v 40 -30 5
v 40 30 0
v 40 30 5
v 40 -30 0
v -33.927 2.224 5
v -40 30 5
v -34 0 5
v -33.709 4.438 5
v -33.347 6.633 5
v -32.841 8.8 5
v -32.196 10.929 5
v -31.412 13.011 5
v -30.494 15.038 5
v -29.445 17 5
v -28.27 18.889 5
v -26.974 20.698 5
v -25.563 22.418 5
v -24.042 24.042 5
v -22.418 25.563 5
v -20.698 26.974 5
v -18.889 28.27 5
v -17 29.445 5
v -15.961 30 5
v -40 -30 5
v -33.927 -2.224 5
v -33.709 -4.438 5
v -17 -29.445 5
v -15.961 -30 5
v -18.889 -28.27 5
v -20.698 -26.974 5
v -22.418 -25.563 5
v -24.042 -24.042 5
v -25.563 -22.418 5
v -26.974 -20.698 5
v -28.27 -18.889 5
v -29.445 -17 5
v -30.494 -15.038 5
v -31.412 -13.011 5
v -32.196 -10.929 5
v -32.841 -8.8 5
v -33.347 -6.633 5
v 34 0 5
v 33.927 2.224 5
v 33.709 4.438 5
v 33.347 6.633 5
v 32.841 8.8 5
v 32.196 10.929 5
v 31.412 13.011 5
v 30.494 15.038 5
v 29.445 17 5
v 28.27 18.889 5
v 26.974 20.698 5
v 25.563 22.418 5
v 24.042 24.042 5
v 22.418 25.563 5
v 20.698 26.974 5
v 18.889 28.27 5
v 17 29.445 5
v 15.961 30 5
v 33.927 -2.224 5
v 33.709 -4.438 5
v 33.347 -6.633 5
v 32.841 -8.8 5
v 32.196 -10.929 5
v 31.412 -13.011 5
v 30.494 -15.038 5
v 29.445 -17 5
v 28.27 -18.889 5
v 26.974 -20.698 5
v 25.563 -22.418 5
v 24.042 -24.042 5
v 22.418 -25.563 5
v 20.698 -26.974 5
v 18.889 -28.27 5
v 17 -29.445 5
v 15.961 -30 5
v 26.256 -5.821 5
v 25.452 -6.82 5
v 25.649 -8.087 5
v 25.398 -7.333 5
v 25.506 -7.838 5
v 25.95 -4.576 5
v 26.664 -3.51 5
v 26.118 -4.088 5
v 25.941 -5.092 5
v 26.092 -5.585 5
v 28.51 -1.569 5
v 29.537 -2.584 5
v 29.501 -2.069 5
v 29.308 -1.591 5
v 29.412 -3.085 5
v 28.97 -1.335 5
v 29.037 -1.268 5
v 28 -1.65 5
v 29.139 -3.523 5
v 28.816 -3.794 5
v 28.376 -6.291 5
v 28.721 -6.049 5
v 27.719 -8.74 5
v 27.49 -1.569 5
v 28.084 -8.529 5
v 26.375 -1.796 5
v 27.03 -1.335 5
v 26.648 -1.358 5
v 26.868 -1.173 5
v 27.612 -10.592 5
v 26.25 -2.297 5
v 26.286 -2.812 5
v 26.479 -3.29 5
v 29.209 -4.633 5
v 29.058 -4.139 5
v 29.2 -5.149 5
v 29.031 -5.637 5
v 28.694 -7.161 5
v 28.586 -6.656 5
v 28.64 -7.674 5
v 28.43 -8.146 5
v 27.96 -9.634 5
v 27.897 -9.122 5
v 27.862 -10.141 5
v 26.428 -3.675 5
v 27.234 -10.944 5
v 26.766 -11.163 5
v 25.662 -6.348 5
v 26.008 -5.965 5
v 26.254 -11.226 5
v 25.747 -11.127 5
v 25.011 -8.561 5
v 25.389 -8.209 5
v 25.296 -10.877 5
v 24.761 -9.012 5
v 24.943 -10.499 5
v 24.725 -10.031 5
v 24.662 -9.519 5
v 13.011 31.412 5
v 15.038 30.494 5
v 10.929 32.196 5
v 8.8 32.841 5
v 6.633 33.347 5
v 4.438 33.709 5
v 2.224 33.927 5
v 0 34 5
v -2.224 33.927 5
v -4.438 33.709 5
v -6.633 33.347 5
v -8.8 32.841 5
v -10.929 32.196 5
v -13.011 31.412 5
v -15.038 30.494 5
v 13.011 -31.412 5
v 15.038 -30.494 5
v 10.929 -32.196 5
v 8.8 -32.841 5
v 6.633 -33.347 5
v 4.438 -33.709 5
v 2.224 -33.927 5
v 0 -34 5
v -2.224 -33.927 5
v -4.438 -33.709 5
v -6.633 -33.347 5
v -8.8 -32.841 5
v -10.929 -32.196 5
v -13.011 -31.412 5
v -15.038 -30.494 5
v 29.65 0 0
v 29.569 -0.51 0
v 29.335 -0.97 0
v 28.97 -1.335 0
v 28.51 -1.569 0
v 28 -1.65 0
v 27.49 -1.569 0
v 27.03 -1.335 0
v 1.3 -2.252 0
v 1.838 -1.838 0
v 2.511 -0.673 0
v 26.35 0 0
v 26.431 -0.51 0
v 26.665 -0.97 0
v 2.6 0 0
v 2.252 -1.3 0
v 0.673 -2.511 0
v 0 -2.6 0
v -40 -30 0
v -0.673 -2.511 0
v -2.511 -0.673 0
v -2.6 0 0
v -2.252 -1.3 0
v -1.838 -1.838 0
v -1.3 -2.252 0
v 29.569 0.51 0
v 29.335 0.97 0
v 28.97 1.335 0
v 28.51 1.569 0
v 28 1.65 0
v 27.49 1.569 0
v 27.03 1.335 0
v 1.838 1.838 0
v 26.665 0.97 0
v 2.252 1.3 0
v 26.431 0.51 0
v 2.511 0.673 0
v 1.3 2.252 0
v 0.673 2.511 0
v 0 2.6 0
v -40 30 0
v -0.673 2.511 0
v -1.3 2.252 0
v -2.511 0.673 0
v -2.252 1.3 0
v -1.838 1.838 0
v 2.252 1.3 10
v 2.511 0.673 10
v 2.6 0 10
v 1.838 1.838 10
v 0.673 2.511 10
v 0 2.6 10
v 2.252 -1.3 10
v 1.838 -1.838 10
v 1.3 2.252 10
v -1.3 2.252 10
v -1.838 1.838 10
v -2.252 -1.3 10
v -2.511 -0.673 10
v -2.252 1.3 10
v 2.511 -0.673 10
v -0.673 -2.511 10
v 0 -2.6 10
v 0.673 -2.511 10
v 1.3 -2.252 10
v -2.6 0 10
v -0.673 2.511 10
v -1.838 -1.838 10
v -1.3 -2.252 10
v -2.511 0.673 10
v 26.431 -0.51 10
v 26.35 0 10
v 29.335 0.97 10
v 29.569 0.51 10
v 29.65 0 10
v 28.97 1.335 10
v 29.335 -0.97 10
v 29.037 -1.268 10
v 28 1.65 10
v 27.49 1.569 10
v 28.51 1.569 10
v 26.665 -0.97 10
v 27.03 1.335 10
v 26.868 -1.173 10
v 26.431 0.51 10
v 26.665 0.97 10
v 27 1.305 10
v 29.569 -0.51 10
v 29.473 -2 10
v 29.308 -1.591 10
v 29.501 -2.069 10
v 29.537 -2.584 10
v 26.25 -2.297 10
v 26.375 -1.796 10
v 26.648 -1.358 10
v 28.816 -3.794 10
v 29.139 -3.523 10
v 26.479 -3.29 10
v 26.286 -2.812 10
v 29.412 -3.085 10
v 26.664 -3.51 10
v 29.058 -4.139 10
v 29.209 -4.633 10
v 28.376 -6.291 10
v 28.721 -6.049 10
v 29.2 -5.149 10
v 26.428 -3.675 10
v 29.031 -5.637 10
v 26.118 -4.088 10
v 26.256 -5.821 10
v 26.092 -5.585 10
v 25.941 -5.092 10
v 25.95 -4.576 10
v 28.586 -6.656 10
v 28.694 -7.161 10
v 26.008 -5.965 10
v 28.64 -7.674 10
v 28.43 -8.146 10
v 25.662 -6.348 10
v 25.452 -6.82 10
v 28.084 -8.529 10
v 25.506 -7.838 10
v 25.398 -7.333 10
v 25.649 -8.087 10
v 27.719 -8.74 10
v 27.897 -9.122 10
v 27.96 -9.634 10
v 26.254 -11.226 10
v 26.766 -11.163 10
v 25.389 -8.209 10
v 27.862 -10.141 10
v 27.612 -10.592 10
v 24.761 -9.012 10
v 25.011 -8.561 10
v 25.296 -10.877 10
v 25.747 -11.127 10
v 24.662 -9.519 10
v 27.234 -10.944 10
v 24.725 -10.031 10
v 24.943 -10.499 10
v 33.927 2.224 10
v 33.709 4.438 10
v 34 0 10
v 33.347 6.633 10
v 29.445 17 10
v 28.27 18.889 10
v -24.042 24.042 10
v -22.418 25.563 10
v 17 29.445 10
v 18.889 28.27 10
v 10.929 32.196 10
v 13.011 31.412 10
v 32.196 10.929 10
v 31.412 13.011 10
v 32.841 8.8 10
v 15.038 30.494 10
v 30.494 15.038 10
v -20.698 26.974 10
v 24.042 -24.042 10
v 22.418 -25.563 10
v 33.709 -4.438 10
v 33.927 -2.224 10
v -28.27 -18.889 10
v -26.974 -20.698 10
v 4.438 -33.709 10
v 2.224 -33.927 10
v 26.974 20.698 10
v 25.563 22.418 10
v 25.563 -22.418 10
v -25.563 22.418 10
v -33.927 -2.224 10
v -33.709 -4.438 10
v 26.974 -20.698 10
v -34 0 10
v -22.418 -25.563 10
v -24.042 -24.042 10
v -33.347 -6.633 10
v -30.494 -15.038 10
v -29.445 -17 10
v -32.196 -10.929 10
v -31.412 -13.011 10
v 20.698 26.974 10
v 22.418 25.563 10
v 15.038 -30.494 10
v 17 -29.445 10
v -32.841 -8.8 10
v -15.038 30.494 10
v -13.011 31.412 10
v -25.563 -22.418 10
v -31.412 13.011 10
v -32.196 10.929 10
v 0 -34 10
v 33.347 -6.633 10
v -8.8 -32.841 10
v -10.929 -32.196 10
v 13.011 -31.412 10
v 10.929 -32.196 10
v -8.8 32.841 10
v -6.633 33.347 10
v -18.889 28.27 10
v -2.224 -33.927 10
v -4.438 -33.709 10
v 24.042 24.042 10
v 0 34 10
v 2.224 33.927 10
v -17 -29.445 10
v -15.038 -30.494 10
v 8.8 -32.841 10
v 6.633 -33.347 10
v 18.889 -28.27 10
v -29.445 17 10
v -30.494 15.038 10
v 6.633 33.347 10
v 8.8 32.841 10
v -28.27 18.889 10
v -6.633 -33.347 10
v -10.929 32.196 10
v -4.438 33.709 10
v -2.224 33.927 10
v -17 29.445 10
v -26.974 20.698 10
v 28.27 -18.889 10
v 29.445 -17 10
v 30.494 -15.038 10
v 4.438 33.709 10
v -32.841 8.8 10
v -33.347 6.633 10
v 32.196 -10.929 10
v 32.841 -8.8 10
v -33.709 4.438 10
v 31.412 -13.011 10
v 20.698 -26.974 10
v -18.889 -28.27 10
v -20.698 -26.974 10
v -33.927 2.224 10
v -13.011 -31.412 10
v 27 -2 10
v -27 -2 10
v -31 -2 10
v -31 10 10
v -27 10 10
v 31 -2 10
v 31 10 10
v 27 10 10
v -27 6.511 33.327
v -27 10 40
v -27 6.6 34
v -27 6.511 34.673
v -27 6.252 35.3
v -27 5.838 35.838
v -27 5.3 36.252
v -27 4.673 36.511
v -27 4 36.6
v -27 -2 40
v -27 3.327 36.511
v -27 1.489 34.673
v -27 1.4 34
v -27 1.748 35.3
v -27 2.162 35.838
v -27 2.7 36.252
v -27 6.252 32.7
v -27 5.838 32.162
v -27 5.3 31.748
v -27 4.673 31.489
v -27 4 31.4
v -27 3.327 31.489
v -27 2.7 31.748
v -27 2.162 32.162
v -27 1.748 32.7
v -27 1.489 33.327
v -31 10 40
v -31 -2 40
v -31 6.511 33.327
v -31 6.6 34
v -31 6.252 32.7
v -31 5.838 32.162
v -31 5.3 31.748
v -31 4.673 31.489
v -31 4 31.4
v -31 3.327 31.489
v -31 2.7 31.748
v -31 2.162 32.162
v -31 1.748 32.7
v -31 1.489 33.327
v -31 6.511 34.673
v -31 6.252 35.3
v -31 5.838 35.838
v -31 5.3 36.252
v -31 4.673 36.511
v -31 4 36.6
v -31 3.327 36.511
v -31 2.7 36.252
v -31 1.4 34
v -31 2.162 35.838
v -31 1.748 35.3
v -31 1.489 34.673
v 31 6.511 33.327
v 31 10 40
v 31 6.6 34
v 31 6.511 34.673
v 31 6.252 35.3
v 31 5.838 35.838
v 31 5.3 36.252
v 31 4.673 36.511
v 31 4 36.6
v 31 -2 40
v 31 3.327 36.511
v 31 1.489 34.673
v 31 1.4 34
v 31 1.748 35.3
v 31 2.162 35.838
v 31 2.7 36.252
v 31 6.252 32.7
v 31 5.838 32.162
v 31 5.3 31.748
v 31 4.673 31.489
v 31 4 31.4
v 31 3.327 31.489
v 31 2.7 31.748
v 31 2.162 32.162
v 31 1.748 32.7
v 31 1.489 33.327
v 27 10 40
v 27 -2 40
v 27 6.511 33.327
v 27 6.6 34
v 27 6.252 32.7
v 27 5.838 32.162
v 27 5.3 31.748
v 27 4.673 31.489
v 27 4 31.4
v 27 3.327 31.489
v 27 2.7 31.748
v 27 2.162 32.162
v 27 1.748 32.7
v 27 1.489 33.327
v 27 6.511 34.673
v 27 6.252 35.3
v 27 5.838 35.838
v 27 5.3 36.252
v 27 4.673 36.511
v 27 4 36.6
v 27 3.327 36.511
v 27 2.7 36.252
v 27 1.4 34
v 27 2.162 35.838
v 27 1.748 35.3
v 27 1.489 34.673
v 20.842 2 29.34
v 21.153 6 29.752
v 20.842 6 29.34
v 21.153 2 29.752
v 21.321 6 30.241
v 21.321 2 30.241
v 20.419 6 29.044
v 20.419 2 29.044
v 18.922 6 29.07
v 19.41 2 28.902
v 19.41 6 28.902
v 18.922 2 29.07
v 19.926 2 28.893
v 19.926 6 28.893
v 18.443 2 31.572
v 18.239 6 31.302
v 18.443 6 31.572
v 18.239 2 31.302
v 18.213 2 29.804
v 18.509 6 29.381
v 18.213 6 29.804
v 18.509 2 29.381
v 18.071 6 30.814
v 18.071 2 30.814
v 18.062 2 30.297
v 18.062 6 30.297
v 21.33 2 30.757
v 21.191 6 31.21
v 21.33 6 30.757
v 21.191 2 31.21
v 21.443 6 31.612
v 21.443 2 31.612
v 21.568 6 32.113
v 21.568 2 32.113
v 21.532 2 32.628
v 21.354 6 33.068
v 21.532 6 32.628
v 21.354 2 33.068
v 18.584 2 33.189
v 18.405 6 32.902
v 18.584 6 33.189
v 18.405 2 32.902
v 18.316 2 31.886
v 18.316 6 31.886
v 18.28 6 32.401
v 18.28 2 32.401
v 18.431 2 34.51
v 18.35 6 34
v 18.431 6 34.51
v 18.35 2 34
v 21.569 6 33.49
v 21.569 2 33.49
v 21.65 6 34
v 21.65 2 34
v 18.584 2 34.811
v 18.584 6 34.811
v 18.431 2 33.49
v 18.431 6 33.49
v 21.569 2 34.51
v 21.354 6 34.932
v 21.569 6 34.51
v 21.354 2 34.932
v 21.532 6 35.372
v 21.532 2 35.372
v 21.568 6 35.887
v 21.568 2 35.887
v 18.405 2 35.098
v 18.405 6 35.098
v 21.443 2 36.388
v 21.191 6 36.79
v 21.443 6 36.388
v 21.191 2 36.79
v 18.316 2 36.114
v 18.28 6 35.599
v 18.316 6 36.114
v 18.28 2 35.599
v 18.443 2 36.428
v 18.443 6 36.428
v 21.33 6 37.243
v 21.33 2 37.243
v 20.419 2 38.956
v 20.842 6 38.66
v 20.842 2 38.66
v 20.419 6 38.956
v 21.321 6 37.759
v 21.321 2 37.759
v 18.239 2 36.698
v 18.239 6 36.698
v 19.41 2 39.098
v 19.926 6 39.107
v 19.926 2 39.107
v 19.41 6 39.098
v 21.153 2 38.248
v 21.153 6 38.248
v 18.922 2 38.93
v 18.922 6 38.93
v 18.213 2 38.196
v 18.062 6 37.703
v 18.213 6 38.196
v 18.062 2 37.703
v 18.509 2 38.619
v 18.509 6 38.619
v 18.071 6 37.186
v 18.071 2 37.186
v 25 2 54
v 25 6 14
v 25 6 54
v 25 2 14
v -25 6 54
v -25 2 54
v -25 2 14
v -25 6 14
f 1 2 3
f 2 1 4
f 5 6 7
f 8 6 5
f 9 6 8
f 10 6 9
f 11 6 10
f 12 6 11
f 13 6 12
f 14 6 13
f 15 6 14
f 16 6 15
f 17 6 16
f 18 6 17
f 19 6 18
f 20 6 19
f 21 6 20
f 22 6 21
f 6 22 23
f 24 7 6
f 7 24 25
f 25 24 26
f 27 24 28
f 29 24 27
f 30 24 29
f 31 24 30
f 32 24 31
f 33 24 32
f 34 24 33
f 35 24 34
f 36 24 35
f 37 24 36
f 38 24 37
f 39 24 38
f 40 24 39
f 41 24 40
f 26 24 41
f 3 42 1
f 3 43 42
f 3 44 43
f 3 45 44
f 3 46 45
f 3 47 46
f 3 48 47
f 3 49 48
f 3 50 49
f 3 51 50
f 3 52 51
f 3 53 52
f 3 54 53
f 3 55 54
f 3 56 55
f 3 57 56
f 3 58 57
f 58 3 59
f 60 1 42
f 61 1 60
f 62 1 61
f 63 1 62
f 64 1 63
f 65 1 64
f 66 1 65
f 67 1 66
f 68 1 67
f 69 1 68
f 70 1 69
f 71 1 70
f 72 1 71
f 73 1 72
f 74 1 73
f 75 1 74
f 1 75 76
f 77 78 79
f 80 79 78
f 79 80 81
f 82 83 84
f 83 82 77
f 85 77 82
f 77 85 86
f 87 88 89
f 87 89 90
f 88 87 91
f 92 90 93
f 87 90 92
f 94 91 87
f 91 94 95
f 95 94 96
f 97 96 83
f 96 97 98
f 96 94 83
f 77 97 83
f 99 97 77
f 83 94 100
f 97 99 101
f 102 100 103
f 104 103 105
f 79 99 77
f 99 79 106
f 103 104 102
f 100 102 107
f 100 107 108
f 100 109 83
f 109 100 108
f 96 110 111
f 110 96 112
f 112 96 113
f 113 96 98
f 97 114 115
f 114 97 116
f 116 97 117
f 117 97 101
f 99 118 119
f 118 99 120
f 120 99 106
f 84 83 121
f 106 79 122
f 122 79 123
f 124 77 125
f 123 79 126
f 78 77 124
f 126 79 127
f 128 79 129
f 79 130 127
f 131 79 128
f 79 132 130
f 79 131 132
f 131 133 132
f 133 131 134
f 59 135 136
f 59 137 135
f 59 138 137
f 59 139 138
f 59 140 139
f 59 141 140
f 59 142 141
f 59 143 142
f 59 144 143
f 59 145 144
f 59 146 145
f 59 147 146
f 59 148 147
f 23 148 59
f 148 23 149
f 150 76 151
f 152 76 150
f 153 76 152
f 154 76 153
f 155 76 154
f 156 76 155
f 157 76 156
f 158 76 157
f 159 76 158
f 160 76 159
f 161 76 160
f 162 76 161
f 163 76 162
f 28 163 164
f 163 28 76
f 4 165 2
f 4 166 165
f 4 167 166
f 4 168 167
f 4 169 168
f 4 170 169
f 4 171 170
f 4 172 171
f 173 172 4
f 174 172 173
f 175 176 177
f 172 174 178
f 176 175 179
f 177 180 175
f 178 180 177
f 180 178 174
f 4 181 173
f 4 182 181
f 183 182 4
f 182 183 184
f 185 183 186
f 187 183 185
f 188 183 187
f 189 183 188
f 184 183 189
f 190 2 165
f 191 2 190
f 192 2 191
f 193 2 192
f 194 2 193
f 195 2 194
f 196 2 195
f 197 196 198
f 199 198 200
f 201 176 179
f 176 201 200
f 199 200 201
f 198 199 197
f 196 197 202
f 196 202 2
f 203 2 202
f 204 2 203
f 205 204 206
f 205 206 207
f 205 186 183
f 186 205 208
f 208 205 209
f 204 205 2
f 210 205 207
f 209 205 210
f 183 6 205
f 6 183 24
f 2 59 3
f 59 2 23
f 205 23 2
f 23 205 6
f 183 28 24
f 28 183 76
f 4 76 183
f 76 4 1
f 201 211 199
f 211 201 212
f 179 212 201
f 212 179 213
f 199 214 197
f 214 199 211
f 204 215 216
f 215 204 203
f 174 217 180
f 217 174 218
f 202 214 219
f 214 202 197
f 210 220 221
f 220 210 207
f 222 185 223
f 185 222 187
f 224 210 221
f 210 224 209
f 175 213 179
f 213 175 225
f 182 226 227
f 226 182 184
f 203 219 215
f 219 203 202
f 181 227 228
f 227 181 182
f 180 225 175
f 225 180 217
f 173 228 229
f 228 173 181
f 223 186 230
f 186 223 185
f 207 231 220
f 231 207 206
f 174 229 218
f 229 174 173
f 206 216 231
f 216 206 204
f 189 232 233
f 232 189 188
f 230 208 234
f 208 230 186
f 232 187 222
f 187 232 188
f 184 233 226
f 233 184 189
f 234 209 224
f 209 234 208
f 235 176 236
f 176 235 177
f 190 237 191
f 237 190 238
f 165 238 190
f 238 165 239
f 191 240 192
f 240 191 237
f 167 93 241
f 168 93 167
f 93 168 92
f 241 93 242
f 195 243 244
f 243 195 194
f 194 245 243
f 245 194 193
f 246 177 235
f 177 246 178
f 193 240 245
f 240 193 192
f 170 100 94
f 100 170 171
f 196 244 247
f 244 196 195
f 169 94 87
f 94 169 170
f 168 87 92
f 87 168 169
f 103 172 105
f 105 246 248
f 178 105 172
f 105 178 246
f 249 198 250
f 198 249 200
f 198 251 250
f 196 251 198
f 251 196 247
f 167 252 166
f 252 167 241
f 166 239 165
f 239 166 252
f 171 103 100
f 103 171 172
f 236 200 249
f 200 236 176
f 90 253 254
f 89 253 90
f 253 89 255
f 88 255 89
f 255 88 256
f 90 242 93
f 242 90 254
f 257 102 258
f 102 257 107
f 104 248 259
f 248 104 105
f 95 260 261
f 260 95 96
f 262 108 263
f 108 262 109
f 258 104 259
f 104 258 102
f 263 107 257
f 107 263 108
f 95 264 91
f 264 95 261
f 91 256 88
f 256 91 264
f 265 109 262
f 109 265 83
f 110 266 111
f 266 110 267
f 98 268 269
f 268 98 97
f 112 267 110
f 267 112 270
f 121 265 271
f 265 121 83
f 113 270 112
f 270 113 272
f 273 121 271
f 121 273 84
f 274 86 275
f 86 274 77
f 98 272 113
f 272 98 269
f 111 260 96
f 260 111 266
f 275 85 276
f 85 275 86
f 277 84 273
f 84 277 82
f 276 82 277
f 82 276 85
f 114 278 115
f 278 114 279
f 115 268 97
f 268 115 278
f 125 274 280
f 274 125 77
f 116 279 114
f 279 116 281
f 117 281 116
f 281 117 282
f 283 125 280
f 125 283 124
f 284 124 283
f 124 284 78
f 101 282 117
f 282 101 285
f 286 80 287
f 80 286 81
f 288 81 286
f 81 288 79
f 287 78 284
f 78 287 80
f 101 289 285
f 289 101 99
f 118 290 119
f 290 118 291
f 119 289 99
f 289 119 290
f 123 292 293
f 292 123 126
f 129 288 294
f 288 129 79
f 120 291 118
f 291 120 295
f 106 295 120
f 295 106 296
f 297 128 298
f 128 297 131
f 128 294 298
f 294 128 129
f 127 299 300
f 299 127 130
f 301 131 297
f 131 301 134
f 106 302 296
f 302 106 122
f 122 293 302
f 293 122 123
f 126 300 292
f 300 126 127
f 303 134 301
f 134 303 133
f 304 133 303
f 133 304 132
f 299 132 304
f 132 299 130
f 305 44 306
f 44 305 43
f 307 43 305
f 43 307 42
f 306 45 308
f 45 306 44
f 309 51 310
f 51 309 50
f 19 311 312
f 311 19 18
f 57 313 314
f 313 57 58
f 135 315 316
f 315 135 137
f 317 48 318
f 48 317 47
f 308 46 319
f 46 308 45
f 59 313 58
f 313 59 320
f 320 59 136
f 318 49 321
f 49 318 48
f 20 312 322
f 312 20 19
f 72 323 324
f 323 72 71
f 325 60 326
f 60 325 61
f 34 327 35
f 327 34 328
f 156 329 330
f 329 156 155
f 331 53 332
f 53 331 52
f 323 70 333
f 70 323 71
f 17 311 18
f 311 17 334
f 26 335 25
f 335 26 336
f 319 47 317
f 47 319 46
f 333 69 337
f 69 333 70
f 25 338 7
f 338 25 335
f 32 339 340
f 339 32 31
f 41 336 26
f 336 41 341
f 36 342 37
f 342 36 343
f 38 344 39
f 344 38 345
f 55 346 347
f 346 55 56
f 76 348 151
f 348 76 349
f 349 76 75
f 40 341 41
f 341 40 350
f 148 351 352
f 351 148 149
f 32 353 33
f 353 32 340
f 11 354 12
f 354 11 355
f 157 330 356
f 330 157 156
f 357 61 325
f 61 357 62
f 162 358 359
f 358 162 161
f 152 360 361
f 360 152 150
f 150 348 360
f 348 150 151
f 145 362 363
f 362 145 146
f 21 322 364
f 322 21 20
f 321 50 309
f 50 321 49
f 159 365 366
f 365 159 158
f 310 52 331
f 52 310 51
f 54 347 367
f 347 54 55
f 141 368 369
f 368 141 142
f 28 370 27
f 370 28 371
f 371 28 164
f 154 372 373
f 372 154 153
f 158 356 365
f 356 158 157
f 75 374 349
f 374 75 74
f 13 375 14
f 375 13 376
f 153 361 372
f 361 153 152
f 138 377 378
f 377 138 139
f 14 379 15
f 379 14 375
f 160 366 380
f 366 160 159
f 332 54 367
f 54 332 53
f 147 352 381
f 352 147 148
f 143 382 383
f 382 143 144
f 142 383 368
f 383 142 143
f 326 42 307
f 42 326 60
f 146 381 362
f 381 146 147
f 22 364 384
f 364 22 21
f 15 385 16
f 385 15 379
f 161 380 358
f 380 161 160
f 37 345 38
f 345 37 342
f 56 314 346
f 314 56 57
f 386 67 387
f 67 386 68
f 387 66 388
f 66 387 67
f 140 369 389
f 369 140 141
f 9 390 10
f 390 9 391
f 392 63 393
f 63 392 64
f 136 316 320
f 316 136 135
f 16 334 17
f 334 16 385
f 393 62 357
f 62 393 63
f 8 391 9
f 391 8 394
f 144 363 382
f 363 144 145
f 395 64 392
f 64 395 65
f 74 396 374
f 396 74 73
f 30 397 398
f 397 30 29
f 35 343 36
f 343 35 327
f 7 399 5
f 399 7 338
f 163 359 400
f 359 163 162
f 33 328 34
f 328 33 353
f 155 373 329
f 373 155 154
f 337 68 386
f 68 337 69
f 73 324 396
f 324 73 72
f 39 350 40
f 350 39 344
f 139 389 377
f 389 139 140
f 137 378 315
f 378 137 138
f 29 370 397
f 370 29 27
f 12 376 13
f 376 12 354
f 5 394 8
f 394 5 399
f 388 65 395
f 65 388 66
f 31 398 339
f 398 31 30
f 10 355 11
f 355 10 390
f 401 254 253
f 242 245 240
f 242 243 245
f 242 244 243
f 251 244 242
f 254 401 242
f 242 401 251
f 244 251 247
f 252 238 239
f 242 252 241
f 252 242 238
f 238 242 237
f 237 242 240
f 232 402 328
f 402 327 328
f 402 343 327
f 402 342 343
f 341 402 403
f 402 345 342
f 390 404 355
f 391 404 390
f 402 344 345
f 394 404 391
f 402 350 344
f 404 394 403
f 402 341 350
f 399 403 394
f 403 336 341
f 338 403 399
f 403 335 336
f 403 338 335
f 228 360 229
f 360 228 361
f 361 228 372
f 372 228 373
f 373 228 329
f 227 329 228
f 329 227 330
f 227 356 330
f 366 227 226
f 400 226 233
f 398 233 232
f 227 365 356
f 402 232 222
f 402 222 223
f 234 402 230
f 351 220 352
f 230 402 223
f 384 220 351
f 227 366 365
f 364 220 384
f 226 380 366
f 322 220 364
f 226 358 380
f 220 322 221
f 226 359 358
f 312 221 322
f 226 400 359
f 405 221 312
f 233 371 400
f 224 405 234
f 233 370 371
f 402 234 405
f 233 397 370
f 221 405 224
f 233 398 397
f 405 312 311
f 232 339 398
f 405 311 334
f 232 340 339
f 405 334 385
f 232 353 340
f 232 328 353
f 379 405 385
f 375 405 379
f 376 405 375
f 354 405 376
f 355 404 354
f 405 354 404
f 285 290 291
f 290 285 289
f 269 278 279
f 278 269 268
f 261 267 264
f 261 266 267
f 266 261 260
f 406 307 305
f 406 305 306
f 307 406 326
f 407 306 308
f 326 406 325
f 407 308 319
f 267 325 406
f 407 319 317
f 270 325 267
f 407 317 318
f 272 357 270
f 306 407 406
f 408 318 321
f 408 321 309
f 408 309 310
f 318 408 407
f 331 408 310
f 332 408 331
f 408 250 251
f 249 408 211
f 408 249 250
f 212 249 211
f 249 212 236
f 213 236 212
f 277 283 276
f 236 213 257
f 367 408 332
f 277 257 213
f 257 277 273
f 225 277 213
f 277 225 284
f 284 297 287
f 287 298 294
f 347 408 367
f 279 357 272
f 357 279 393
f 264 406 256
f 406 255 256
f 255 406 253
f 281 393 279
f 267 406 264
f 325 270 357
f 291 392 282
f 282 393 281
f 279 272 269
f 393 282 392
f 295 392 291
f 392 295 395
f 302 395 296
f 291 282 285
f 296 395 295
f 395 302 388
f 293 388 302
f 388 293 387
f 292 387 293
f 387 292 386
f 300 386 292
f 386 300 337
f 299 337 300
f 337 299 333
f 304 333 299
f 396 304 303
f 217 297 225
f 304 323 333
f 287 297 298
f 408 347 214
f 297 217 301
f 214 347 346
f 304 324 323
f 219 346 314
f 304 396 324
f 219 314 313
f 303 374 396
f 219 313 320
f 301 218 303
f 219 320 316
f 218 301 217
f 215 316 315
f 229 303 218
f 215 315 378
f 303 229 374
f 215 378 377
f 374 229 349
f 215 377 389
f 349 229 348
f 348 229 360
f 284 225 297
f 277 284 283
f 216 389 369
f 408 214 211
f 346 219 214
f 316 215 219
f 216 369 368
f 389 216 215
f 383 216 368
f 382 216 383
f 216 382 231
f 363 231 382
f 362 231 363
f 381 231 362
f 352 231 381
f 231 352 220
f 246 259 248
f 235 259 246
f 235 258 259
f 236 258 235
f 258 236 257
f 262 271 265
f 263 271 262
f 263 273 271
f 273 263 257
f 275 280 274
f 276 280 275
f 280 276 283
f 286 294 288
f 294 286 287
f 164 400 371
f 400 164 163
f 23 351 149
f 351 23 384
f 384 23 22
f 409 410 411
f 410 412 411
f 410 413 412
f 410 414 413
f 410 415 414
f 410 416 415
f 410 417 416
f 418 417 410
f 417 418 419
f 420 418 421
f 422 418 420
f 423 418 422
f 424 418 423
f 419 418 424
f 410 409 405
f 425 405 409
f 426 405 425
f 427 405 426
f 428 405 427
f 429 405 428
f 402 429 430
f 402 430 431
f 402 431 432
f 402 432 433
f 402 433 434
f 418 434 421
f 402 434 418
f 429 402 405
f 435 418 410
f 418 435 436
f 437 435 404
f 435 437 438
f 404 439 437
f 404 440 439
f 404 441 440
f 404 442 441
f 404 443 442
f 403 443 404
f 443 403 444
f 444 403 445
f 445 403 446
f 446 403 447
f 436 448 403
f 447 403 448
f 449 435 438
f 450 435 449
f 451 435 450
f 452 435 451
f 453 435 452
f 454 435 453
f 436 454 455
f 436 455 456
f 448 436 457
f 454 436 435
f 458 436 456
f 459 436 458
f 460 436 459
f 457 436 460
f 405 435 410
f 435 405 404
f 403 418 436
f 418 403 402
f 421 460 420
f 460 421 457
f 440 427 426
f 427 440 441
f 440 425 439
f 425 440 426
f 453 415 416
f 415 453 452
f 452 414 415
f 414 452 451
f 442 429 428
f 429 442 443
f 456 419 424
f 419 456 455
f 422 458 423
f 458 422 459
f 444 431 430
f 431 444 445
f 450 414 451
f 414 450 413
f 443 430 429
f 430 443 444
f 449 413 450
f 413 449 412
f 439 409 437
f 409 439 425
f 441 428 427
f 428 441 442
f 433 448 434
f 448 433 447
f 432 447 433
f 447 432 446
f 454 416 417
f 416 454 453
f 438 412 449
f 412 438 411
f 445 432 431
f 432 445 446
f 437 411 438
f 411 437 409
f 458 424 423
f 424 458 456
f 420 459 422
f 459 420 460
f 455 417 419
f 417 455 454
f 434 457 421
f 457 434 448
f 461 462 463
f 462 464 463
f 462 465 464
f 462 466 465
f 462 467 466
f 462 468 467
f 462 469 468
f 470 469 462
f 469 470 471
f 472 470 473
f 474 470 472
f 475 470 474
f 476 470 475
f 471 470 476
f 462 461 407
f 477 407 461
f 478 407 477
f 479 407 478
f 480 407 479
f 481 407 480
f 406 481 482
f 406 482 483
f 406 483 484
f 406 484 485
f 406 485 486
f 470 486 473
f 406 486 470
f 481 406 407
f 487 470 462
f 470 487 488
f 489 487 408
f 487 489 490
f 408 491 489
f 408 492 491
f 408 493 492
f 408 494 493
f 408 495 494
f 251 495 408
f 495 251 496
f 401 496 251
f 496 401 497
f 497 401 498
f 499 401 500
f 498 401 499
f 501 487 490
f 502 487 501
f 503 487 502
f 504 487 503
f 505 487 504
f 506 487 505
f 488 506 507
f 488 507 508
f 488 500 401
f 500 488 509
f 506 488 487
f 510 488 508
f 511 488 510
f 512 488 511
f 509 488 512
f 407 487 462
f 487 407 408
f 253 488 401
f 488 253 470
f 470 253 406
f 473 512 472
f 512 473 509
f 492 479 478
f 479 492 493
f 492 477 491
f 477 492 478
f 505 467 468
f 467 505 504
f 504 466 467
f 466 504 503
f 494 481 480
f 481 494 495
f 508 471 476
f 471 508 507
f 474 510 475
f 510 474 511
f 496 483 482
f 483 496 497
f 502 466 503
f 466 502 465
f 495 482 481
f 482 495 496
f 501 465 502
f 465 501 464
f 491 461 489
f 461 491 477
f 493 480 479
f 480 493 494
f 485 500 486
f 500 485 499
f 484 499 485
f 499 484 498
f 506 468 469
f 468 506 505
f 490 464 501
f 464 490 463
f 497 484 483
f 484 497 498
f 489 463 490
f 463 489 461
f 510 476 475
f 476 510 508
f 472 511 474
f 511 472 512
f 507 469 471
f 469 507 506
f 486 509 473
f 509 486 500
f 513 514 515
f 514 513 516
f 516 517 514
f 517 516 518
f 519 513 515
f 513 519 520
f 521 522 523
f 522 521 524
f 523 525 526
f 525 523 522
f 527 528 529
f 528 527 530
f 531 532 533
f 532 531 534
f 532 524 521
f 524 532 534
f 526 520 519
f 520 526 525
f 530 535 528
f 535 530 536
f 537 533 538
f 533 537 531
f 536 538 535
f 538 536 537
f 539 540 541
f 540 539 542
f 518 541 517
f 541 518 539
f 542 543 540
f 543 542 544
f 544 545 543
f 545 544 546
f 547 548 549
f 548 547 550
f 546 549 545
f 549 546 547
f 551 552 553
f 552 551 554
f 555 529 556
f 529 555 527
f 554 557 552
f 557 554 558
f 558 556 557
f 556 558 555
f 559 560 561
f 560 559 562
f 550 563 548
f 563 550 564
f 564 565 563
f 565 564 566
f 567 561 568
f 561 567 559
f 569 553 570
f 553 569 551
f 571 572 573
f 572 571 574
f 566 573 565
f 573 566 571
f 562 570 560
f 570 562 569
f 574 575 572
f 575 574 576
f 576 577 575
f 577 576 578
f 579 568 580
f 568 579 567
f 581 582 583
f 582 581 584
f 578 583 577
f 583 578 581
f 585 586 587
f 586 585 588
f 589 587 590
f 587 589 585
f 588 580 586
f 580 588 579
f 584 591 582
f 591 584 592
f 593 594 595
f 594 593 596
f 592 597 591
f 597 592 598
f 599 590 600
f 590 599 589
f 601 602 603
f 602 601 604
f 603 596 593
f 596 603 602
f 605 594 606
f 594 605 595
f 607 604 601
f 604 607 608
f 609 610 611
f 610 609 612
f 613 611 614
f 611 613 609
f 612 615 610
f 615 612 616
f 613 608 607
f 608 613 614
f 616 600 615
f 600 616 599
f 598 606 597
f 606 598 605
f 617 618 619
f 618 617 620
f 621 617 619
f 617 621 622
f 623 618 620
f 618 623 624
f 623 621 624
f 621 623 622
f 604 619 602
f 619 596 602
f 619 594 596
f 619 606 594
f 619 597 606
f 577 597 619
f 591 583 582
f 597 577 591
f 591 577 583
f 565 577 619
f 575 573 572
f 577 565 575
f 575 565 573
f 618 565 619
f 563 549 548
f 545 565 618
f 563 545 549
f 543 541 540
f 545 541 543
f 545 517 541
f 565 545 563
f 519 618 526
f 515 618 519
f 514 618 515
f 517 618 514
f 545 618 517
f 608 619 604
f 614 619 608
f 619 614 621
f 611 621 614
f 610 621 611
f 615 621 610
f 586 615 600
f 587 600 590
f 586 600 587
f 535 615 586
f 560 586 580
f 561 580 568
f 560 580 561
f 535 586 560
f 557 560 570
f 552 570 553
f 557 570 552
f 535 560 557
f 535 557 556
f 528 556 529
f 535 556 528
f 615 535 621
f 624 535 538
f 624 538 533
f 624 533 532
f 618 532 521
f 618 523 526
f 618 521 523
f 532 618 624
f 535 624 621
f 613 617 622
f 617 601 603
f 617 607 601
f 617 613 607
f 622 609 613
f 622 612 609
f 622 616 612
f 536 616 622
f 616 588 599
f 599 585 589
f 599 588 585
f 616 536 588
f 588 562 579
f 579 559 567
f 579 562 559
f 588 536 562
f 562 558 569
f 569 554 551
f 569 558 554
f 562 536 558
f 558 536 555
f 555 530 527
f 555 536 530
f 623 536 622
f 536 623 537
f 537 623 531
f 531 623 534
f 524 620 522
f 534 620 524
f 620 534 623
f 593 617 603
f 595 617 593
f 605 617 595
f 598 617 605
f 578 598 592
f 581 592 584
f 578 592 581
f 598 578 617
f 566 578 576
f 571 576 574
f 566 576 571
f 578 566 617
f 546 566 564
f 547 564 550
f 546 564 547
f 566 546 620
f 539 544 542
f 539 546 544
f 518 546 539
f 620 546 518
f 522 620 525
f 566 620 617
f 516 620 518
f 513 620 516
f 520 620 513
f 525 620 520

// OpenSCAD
// Adjustable IWR6843 carrier for the orientation experiment: a base with an
// indexed yaw plate (0-20 deg in 5 deg steps) and a pitch cradle
// (-10..+10 deg in 5 deg steps), pinned with an M3 bolt through the chosen
// index hole so each setting repeats. Lengths in mm.

yaw_steps = [0, 5, 10, 15, 20];
pitch_steps = [-10, -5, 0, 5, 10];
radar_yaw = 0;
radar_pitch = 0;
part = "all";  // "base", "plate" or "cradle" to export one printable part

base_w = 80;
base_d = 60;
base_t = 5;
plate_r = 34;
pivot_d = 5.2;
pin_d = 3.3;
index_r = 28;
cradle_w = 50;
cradle_h = 40;
cradle_t = 4;
cradle_arm = 30;

module index_holes(steps, radius) {
    for (a = steps)
        rotate([0, 0, a]) translate([radius, 0, -1]) cylinder(d = pin_d, h = 50, $fn = 20);
}

module base() {
    difference() {
        translate([-base_w / 2, -base_d / 2, 0]) cube([base_w, base_d, base_t]);
        translate([0, 0, -1]) cylinder(d = pivot_d, h = base_t + 2, $fn = 24);
        translate([0, 0, 0]) index_holes([0], index_r);
    }
}

module yaw_plate() {
    difference() {
        cylinder(r = plate_r, h = base_t, $fn = 96);
        translate([0, 0, -1]) cylinder(d = pivot_d, h = base_t + 2, $fn = 24);
        rotate([0, 0, 0]) index_holes([for (a = yaw_steps) -a], index_r);
    }
    for (x = [-1, 1])
        translate([x * (cradle_w / 2 + cradle_t) - cradle_t / 2, -cradle_t / 2, base_t])
            difference() {
                cube([cradle_t, cradle_t * 3, cradle_arm]);
                translate([-1, cradle_t * 1.5, cradle_arm - 6])
                    rotate([0, 90, 0]) cylinder(d = pivot_d, h = cradle_t + 2, $fn = 24);
            }
}

module pitch_cradle() {
    difference() {
        translate([-cradle_w / 2, -cradle_t / 2, -cradle_h / 2]) cube([cradle_w, cradle_t, cradle_h]);
        for (p = pitch_steps)
            rotate([0, -p, 0]) translate([cradle_w / 2 - 5, -cradle_t, 0])
                rotate([-90, 0, 0]) cylinder(d = pin_d, h = cradle_t * 3, $fn = 20);
    }
}

if (part == "base") base();
else if (part == "plate") yaw_plate();
else if (part == "cradle") pitch_cradle();
else {
    base();
    translate([0, 0, base_t]) rotate([0, 0, radar_yaw]) {
        yaw_plate();
        translate([0, cradle_t, base_t + cradle_arm - 6]) rotate([0, radar_pitch, 0]) pitch_cradle();
    }
}
